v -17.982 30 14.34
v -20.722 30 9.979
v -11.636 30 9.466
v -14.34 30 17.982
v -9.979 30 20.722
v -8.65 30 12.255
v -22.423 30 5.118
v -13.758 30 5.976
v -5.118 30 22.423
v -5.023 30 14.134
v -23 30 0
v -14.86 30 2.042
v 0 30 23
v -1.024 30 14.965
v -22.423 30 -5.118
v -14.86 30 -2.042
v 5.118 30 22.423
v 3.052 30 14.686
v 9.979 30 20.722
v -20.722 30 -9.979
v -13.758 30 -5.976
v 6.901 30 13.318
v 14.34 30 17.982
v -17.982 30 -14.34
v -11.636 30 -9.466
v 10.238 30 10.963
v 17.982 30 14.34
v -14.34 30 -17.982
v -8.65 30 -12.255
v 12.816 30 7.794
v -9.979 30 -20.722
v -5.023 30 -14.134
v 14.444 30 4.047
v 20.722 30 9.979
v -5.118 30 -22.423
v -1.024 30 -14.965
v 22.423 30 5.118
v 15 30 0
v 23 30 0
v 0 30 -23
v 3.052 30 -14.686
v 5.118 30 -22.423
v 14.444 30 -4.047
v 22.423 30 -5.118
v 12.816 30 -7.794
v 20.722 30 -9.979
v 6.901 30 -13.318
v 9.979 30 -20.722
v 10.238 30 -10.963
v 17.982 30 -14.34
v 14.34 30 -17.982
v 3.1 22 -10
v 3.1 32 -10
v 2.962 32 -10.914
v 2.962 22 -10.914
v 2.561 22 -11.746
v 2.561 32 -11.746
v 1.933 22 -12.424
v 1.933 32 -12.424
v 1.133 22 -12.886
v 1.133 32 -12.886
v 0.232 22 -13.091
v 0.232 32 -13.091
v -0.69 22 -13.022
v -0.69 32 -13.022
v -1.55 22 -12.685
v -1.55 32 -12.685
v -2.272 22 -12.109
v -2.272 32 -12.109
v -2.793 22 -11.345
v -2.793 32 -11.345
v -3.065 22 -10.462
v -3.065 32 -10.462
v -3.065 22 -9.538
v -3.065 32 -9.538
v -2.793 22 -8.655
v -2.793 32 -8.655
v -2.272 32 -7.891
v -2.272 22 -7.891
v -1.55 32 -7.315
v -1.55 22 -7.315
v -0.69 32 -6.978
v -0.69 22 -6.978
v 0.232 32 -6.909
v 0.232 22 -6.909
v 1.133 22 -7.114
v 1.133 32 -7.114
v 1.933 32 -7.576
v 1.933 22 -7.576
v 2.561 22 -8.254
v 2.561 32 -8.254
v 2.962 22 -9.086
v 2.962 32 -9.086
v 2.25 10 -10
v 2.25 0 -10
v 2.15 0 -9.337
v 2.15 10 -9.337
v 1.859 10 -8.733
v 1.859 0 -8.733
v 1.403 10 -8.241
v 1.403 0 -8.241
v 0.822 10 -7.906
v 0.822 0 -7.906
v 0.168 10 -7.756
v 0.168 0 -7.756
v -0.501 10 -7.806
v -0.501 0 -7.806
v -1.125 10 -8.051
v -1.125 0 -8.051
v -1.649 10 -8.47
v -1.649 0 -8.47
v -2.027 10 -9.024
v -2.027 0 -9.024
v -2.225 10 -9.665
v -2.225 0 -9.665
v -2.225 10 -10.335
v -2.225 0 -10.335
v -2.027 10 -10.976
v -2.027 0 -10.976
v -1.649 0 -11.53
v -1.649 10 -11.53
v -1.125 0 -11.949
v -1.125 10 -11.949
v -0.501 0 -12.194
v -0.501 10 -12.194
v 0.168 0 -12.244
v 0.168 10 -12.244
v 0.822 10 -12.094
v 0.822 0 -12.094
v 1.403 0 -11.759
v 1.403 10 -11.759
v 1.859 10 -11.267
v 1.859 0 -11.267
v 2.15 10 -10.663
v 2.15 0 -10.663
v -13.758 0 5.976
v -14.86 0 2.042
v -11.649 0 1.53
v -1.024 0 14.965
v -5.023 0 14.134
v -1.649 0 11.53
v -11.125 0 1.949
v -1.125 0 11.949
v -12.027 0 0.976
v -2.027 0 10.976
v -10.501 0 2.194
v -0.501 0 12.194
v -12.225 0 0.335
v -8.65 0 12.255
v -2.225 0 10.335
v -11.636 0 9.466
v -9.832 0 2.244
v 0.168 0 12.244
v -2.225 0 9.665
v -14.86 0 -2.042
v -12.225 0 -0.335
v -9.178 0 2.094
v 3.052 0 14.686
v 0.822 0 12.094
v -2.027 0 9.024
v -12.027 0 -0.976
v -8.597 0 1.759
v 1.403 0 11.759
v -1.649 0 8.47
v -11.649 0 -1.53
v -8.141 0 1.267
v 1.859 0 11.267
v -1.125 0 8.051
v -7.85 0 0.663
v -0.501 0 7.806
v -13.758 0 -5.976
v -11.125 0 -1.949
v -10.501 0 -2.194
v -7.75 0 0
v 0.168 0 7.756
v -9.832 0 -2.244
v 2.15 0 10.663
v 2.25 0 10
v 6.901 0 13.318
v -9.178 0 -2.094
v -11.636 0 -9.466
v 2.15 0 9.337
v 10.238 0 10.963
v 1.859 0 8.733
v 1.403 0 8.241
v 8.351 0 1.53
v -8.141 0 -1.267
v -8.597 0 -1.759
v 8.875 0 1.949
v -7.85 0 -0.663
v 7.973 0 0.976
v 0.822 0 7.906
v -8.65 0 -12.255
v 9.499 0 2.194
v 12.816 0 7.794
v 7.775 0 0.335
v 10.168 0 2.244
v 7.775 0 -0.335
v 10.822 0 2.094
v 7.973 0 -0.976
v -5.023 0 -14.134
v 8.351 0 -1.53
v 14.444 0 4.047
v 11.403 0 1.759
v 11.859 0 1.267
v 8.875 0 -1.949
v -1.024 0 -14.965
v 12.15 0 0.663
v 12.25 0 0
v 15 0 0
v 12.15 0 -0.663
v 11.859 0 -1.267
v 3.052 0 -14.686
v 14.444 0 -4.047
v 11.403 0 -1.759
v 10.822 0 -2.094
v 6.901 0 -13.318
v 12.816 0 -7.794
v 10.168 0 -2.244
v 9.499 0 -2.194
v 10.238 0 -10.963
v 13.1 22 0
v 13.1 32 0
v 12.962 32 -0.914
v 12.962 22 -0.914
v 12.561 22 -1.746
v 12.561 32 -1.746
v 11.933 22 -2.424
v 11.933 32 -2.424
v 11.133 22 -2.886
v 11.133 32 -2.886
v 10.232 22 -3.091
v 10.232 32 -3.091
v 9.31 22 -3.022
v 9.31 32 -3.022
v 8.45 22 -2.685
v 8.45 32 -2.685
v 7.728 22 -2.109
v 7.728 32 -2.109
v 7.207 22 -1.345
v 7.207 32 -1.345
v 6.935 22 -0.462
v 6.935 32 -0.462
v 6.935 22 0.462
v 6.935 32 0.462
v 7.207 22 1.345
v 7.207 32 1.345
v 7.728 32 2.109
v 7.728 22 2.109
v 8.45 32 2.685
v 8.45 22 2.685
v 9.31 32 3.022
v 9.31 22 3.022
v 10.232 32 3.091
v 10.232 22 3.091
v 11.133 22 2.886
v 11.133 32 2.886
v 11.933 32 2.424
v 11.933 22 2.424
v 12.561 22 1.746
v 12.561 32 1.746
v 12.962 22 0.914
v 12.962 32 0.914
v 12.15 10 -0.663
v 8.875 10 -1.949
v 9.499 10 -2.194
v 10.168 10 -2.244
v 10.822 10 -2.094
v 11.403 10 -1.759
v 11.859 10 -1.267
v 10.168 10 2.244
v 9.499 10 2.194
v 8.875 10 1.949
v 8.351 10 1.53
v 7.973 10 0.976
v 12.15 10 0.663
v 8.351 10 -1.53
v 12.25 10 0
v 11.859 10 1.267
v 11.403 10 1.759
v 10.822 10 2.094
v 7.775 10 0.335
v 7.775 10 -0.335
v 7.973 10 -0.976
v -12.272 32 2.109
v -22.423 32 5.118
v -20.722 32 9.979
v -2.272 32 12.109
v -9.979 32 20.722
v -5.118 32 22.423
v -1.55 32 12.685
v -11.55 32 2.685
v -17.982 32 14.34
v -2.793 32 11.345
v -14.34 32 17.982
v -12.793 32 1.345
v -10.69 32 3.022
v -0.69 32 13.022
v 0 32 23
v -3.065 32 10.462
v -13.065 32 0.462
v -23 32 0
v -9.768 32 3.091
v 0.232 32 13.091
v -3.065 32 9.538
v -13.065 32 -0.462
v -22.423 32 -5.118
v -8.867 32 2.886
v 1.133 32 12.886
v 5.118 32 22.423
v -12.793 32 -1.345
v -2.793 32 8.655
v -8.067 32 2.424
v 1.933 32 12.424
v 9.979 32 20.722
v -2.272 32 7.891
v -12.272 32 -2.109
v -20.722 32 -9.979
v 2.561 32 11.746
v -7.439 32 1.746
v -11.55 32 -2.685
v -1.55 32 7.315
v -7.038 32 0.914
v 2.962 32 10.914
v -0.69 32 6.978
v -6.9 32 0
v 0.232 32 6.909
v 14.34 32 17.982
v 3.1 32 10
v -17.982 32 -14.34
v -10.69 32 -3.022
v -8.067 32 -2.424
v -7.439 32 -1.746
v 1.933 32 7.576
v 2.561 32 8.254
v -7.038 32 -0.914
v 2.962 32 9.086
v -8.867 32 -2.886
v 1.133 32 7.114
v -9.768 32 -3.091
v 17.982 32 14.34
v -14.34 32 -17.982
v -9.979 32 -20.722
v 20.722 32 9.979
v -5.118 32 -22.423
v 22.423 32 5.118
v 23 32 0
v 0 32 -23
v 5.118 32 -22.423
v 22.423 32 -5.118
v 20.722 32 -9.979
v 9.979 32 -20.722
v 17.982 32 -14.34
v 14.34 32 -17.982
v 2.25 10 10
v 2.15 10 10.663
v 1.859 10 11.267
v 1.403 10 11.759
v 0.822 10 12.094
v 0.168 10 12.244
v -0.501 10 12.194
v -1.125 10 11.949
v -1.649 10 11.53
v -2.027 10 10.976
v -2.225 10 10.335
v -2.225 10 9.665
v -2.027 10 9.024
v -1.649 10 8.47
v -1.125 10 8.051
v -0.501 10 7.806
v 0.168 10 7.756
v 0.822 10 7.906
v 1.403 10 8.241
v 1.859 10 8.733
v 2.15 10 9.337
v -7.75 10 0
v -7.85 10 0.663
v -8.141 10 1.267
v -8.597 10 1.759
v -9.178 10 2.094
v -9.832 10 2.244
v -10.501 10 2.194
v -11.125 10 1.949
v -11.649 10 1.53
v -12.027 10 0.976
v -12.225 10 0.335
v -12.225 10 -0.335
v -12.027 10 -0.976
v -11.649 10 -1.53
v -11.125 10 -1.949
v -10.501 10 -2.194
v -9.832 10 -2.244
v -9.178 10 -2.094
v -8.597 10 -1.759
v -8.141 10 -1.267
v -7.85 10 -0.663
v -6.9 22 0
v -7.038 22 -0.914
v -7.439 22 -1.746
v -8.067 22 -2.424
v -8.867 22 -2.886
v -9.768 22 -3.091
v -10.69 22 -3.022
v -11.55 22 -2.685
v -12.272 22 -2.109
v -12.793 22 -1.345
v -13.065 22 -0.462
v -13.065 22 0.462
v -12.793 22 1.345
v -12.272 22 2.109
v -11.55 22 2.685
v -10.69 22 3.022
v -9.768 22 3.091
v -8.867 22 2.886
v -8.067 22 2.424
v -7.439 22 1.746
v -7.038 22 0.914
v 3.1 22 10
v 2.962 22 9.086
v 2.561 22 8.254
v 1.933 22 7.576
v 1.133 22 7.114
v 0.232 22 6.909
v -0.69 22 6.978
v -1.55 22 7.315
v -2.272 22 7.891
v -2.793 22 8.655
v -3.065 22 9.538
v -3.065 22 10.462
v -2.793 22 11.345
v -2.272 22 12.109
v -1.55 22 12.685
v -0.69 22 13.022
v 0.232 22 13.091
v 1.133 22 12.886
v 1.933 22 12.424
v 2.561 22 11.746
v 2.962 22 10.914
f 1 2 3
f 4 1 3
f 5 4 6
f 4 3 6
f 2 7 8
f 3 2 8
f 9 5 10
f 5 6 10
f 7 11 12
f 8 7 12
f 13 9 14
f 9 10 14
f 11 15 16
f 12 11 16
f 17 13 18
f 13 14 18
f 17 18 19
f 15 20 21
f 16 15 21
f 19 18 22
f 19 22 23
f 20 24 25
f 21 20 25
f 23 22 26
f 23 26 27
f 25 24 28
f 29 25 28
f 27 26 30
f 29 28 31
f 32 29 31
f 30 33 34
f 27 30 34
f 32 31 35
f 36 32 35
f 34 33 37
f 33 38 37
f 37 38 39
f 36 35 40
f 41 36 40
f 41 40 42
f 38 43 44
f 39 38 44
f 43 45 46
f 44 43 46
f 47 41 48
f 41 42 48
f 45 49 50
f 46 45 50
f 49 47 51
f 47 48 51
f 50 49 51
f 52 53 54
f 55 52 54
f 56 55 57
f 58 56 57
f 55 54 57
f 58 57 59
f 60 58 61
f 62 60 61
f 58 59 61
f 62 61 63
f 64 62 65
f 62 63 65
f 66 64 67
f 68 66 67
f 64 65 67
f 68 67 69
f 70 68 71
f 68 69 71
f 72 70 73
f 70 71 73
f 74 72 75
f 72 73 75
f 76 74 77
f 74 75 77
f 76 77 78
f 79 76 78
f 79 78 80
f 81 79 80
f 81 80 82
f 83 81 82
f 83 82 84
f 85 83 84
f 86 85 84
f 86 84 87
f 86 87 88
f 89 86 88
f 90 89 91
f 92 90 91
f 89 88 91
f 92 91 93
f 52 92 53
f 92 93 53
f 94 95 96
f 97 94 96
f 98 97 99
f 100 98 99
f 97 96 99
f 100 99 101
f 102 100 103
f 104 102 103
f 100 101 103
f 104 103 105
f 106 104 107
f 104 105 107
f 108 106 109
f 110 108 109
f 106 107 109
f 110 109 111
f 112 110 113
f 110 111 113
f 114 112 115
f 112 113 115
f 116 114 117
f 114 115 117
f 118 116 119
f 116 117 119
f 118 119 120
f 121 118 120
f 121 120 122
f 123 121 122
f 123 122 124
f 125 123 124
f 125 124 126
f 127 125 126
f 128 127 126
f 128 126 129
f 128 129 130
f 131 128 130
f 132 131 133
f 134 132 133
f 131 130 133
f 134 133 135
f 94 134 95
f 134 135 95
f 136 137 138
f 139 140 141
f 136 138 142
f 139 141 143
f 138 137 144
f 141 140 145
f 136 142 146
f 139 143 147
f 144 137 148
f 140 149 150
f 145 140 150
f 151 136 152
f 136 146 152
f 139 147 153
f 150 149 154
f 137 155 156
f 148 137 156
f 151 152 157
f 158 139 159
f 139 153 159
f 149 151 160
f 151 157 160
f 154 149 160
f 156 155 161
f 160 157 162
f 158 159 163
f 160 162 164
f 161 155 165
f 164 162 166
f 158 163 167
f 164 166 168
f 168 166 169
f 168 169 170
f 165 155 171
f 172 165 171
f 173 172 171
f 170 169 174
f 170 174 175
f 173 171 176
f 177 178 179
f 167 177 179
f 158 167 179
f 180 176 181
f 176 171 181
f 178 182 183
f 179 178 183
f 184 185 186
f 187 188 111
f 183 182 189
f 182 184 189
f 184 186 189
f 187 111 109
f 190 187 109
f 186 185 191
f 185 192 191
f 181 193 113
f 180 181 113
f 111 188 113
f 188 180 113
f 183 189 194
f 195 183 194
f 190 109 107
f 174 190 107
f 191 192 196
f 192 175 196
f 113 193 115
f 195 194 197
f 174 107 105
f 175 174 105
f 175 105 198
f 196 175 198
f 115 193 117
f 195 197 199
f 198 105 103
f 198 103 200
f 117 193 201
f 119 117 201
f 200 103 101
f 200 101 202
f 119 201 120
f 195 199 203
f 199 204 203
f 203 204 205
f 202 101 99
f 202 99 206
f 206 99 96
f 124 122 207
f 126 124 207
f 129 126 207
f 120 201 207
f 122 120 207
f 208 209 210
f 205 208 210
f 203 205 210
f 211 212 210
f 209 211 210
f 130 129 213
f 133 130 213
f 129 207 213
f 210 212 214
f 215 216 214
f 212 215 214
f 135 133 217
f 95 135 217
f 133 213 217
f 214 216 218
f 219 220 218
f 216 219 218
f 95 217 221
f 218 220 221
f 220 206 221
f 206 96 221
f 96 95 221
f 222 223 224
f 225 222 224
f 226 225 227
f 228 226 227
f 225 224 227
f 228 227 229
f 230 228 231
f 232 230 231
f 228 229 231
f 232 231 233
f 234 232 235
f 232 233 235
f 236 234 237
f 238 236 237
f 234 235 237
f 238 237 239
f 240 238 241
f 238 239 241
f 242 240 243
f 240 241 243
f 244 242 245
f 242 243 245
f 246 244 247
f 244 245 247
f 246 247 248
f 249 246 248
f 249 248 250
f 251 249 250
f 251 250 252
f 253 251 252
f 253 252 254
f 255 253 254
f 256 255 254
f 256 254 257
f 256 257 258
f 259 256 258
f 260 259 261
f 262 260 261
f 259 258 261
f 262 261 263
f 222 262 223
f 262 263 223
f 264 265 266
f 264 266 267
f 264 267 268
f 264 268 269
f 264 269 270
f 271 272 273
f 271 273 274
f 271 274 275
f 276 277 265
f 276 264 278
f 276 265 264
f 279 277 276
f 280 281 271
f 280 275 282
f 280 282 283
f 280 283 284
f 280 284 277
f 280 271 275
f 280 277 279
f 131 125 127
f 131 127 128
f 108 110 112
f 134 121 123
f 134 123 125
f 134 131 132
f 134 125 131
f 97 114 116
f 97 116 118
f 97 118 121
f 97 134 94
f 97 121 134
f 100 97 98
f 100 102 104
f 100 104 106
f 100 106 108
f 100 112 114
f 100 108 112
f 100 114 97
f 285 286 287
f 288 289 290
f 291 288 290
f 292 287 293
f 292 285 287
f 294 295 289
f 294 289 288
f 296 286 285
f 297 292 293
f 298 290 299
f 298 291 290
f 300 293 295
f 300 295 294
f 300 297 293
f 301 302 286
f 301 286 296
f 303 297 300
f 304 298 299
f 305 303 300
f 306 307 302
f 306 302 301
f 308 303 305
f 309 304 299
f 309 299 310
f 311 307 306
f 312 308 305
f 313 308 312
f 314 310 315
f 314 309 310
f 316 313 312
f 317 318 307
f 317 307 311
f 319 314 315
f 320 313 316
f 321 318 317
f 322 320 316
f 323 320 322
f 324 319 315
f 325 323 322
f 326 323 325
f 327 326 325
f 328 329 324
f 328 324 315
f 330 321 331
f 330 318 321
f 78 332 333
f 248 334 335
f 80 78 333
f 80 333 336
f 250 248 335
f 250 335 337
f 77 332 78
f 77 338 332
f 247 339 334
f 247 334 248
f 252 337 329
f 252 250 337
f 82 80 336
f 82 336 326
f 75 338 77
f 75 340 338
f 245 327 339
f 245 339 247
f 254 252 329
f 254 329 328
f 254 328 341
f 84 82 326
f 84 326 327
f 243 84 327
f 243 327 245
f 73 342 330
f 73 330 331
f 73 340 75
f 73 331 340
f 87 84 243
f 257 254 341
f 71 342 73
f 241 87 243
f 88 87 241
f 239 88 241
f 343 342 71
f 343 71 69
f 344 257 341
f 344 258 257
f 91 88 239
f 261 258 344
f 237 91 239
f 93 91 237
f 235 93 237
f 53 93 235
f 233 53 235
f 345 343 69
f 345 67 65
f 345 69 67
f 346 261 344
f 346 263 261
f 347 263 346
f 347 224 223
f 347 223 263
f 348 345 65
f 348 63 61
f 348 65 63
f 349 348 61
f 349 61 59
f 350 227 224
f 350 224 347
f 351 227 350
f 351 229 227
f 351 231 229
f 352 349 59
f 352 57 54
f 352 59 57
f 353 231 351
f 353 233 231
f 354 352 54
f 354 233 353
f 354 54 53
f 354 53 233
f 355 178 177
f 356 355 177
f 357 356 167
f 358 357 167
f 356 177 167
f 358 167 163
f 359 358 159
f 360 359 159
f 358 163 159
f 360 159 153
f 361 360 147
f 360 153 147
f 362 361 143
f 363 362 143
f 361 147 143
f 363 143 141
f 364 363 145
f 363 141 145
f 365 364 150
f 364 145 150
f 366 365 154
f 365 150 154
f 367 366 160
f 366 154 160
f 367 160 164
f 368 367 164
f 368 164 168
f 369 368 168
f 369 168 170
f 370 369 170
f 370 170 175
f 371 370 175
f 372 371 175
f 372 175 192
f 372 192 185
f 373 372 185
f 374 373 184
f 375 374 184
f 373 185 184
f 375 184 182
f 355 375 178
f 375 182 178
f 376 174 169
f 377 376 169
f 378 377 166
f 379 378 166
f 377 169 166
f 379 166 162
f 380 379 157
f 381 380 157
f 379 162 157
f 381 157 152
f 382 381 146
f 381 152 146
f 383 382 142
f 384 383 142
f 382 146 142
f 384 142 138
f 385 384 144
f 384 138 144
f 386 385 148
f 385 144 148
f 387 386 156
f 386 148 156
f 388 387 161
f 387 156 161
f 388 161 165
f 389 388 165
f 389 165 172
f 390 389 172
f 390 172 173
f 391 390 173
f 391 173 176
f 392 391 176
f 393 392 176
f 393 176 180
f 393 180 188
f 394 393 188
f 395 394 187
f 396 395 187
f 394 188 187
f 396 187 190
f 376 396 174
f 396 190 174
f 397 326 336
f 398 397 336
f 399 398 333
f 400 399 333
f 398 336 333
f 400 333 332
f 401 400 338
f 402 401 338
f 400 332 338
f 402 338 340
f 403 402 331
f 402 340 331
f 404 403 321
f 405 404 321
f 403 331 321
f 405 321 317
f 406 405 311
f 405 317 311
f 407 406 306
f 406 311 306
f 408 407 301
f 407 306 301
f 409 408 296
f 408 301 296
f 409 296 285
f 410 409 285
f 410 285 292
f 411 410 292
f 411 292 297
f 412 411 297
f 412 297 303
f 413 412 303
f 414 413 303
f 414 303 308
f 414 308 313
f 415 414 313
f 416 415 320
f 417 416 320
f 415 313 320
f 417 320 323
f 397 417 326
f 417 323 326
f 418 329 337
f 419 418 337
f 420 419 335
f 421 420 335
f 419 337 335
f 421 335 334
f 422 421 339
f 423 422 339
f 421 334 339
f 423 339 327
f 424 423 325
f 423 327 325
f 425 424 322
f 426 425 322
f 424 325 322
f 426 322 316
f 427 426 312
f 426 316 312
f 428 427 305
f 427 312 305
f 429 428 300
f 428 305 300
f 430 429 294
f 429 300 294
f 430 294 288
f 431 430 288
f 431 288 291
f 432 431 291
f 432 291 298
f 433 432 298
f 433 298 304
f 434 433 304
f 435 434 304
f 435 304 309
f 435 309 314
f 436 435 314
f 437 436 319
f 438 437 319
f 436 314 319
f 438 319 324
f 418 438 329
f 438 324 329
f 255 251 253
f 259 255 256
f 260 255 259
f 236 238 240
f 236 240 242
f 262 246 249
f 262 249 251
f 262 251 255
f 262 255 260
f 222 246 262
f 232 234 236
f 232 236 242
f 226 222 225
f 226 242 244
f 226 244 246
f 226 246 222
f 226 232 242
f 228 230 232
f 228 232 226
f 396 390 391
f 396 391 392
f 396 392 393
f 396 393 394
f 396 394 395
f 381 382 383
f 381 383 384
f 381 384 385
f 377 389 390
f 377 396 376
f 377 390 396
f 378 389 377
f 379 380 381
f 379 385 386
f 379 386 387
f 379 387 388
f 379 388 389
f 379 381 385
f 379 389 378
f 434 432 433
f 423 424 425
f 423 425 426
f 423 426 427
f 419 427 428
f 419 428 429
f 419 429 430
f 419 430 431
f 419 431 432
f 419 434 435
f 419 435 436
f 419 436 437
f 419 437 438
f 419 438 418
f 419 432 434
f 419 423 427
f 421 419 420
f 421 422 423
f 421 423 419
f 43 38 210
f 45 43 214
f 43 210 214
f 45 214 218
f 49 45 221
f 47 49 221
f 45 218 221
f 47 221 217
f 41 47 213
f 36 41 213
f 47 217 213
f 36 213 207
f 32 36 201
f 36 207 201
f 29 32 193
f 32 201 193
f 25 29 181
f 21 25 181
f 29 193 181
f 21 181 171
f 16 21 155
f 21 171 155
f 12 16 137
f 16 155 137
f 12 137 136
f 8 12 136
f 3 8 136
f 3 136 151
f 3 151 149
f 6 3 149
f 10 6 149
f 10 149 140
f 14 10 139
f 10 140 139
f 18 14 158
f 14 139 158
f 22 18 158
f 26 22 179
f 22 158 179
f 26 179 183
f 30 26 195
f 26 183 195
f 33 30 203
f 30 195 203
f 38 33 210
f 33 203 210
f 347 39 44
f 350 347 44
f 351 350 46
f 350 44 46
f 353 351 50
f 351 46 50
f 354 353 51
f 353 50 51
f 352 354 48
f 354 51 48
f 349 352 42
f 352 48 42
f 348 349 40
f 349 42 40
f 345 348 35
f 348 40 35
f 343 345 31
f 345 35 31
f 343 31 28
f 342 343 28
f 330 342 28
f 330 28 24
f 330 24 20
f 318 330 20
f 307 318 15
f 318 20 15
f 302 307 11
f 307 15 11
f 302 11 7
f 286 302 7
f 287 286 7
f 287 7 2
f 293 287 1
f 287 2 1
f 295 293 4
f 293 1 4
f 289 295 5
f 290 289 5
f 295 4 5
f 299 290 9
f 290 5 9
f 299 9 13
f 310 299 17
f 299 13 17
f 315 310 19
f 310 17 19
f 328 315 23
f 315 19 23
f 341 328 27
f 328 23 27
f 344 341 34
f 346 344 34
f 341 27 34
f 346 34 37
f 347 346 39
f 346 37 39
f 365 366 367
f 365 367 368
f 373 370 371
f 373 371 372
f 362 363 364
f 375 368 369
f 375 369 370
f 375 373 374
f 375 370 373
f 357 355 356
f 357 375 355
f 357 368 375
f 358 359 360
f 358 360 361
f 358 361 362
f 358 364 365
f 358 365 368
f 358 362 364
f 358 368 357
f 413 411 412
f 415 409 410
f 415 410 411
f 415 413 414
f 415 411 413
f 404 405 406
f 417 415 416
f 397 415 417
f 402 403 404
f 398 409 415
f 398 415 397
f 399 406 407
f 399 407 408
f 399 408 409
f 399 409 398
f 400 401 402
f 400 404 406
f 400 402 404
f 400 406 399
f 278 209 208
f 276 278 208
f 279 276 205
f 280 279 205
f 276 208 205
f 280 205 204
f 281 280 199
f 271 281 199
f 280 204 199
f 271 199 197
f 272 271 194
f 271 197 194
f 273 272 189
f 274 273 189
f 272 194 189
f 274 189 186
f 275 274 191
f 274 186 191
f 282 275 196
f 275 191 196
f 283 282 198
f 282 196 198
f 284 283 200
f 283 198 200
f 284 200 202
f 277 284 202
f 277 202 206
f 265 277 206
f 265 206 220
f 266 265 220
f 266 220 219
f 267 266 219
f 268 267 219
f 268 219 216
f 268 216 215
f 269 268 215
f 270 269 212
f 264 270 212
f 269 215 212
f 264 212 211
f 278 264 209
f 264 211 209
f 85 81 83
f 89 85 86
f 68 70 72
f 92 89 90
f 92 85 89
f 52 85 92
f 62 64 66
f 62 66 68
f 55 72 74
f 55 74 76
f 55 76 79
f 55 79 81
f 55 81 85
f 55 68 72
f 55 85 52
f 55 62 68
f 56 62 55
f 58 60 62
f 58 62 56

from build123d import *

# Parameters (mm, degrees)
SKETCH1_R           = 15
BOSS_EXTRUDE1_DEPTH = 30
SKETCH2_R           = 23
BOSS_EXTRUDE2_DEPTH = 2
SKETCH3_R           = 2.25
CUT_EXTRUDE1_DEPTH  = 10
SKETCH4_R           = 3.1
CUT_EXTRUDE2_DEPTH  = 10


with BuildPart() as part:
    # Sketch1 → Boss-Extrude1 (new body)
    with BuildSketch(Plane(origin=(0, 0, 0), x_dir=(1, 0, 0), z_dir=(0, 1, 0))):
        Circle(SKETCH1_R)
    extrude(amount=BOSS_EXTRUDE1_DEPTH)

    # Sketch2 → Boss-Extrude2 (add)
    with BuildSketch(Plane(origin=(0, 30, 0), x_dir=(1, 0, 0), z_dir=(0, 1, 0))):
        Circle(SKETCH2_R)
    extrude(amount=BOSS_EXTRUDE2_DEPTH)

    # Sketch3 → Cut-Extrude1 (cut)
    with BuildSketch(Plane.XZ):
        with Locations((0, 10)):
            Circle(SKETCH3_R)
        with Locations((10, 0)):
            Circle(SKETCH3_R)
        with Locations((0, -10)):
            Circle(SKETCH3_R)
        with Locations((-10, 0)):
            Circle(SKETCH3_R)
    extrude(amount=-CUT_EXTRUDE1_DEPTH, mode=Mode.SUBTRACT)

    # Sketch4 → Cut-Extrude2 (cut)
    with BuildSketch(Plane(origin=(0, 32, 0), x_dir=(1, 0, 0), z_dir=(0, 1, 0))):
        with Locations((0, 10)):
            Circle(SKETCH4_R)
        with Locations((10, 0)):
            Circle(SKETCH4_R)
        with Locations((0, -10)):
            Circle(SKETCH4_R)
        with Locations((-10, 0)):
            Circle(SKETCH4_R)
    extrude(amount=-CUT_EXTRUDE2_DEPTH, mode=Mode.SUBTRACT)


solid = part.part
